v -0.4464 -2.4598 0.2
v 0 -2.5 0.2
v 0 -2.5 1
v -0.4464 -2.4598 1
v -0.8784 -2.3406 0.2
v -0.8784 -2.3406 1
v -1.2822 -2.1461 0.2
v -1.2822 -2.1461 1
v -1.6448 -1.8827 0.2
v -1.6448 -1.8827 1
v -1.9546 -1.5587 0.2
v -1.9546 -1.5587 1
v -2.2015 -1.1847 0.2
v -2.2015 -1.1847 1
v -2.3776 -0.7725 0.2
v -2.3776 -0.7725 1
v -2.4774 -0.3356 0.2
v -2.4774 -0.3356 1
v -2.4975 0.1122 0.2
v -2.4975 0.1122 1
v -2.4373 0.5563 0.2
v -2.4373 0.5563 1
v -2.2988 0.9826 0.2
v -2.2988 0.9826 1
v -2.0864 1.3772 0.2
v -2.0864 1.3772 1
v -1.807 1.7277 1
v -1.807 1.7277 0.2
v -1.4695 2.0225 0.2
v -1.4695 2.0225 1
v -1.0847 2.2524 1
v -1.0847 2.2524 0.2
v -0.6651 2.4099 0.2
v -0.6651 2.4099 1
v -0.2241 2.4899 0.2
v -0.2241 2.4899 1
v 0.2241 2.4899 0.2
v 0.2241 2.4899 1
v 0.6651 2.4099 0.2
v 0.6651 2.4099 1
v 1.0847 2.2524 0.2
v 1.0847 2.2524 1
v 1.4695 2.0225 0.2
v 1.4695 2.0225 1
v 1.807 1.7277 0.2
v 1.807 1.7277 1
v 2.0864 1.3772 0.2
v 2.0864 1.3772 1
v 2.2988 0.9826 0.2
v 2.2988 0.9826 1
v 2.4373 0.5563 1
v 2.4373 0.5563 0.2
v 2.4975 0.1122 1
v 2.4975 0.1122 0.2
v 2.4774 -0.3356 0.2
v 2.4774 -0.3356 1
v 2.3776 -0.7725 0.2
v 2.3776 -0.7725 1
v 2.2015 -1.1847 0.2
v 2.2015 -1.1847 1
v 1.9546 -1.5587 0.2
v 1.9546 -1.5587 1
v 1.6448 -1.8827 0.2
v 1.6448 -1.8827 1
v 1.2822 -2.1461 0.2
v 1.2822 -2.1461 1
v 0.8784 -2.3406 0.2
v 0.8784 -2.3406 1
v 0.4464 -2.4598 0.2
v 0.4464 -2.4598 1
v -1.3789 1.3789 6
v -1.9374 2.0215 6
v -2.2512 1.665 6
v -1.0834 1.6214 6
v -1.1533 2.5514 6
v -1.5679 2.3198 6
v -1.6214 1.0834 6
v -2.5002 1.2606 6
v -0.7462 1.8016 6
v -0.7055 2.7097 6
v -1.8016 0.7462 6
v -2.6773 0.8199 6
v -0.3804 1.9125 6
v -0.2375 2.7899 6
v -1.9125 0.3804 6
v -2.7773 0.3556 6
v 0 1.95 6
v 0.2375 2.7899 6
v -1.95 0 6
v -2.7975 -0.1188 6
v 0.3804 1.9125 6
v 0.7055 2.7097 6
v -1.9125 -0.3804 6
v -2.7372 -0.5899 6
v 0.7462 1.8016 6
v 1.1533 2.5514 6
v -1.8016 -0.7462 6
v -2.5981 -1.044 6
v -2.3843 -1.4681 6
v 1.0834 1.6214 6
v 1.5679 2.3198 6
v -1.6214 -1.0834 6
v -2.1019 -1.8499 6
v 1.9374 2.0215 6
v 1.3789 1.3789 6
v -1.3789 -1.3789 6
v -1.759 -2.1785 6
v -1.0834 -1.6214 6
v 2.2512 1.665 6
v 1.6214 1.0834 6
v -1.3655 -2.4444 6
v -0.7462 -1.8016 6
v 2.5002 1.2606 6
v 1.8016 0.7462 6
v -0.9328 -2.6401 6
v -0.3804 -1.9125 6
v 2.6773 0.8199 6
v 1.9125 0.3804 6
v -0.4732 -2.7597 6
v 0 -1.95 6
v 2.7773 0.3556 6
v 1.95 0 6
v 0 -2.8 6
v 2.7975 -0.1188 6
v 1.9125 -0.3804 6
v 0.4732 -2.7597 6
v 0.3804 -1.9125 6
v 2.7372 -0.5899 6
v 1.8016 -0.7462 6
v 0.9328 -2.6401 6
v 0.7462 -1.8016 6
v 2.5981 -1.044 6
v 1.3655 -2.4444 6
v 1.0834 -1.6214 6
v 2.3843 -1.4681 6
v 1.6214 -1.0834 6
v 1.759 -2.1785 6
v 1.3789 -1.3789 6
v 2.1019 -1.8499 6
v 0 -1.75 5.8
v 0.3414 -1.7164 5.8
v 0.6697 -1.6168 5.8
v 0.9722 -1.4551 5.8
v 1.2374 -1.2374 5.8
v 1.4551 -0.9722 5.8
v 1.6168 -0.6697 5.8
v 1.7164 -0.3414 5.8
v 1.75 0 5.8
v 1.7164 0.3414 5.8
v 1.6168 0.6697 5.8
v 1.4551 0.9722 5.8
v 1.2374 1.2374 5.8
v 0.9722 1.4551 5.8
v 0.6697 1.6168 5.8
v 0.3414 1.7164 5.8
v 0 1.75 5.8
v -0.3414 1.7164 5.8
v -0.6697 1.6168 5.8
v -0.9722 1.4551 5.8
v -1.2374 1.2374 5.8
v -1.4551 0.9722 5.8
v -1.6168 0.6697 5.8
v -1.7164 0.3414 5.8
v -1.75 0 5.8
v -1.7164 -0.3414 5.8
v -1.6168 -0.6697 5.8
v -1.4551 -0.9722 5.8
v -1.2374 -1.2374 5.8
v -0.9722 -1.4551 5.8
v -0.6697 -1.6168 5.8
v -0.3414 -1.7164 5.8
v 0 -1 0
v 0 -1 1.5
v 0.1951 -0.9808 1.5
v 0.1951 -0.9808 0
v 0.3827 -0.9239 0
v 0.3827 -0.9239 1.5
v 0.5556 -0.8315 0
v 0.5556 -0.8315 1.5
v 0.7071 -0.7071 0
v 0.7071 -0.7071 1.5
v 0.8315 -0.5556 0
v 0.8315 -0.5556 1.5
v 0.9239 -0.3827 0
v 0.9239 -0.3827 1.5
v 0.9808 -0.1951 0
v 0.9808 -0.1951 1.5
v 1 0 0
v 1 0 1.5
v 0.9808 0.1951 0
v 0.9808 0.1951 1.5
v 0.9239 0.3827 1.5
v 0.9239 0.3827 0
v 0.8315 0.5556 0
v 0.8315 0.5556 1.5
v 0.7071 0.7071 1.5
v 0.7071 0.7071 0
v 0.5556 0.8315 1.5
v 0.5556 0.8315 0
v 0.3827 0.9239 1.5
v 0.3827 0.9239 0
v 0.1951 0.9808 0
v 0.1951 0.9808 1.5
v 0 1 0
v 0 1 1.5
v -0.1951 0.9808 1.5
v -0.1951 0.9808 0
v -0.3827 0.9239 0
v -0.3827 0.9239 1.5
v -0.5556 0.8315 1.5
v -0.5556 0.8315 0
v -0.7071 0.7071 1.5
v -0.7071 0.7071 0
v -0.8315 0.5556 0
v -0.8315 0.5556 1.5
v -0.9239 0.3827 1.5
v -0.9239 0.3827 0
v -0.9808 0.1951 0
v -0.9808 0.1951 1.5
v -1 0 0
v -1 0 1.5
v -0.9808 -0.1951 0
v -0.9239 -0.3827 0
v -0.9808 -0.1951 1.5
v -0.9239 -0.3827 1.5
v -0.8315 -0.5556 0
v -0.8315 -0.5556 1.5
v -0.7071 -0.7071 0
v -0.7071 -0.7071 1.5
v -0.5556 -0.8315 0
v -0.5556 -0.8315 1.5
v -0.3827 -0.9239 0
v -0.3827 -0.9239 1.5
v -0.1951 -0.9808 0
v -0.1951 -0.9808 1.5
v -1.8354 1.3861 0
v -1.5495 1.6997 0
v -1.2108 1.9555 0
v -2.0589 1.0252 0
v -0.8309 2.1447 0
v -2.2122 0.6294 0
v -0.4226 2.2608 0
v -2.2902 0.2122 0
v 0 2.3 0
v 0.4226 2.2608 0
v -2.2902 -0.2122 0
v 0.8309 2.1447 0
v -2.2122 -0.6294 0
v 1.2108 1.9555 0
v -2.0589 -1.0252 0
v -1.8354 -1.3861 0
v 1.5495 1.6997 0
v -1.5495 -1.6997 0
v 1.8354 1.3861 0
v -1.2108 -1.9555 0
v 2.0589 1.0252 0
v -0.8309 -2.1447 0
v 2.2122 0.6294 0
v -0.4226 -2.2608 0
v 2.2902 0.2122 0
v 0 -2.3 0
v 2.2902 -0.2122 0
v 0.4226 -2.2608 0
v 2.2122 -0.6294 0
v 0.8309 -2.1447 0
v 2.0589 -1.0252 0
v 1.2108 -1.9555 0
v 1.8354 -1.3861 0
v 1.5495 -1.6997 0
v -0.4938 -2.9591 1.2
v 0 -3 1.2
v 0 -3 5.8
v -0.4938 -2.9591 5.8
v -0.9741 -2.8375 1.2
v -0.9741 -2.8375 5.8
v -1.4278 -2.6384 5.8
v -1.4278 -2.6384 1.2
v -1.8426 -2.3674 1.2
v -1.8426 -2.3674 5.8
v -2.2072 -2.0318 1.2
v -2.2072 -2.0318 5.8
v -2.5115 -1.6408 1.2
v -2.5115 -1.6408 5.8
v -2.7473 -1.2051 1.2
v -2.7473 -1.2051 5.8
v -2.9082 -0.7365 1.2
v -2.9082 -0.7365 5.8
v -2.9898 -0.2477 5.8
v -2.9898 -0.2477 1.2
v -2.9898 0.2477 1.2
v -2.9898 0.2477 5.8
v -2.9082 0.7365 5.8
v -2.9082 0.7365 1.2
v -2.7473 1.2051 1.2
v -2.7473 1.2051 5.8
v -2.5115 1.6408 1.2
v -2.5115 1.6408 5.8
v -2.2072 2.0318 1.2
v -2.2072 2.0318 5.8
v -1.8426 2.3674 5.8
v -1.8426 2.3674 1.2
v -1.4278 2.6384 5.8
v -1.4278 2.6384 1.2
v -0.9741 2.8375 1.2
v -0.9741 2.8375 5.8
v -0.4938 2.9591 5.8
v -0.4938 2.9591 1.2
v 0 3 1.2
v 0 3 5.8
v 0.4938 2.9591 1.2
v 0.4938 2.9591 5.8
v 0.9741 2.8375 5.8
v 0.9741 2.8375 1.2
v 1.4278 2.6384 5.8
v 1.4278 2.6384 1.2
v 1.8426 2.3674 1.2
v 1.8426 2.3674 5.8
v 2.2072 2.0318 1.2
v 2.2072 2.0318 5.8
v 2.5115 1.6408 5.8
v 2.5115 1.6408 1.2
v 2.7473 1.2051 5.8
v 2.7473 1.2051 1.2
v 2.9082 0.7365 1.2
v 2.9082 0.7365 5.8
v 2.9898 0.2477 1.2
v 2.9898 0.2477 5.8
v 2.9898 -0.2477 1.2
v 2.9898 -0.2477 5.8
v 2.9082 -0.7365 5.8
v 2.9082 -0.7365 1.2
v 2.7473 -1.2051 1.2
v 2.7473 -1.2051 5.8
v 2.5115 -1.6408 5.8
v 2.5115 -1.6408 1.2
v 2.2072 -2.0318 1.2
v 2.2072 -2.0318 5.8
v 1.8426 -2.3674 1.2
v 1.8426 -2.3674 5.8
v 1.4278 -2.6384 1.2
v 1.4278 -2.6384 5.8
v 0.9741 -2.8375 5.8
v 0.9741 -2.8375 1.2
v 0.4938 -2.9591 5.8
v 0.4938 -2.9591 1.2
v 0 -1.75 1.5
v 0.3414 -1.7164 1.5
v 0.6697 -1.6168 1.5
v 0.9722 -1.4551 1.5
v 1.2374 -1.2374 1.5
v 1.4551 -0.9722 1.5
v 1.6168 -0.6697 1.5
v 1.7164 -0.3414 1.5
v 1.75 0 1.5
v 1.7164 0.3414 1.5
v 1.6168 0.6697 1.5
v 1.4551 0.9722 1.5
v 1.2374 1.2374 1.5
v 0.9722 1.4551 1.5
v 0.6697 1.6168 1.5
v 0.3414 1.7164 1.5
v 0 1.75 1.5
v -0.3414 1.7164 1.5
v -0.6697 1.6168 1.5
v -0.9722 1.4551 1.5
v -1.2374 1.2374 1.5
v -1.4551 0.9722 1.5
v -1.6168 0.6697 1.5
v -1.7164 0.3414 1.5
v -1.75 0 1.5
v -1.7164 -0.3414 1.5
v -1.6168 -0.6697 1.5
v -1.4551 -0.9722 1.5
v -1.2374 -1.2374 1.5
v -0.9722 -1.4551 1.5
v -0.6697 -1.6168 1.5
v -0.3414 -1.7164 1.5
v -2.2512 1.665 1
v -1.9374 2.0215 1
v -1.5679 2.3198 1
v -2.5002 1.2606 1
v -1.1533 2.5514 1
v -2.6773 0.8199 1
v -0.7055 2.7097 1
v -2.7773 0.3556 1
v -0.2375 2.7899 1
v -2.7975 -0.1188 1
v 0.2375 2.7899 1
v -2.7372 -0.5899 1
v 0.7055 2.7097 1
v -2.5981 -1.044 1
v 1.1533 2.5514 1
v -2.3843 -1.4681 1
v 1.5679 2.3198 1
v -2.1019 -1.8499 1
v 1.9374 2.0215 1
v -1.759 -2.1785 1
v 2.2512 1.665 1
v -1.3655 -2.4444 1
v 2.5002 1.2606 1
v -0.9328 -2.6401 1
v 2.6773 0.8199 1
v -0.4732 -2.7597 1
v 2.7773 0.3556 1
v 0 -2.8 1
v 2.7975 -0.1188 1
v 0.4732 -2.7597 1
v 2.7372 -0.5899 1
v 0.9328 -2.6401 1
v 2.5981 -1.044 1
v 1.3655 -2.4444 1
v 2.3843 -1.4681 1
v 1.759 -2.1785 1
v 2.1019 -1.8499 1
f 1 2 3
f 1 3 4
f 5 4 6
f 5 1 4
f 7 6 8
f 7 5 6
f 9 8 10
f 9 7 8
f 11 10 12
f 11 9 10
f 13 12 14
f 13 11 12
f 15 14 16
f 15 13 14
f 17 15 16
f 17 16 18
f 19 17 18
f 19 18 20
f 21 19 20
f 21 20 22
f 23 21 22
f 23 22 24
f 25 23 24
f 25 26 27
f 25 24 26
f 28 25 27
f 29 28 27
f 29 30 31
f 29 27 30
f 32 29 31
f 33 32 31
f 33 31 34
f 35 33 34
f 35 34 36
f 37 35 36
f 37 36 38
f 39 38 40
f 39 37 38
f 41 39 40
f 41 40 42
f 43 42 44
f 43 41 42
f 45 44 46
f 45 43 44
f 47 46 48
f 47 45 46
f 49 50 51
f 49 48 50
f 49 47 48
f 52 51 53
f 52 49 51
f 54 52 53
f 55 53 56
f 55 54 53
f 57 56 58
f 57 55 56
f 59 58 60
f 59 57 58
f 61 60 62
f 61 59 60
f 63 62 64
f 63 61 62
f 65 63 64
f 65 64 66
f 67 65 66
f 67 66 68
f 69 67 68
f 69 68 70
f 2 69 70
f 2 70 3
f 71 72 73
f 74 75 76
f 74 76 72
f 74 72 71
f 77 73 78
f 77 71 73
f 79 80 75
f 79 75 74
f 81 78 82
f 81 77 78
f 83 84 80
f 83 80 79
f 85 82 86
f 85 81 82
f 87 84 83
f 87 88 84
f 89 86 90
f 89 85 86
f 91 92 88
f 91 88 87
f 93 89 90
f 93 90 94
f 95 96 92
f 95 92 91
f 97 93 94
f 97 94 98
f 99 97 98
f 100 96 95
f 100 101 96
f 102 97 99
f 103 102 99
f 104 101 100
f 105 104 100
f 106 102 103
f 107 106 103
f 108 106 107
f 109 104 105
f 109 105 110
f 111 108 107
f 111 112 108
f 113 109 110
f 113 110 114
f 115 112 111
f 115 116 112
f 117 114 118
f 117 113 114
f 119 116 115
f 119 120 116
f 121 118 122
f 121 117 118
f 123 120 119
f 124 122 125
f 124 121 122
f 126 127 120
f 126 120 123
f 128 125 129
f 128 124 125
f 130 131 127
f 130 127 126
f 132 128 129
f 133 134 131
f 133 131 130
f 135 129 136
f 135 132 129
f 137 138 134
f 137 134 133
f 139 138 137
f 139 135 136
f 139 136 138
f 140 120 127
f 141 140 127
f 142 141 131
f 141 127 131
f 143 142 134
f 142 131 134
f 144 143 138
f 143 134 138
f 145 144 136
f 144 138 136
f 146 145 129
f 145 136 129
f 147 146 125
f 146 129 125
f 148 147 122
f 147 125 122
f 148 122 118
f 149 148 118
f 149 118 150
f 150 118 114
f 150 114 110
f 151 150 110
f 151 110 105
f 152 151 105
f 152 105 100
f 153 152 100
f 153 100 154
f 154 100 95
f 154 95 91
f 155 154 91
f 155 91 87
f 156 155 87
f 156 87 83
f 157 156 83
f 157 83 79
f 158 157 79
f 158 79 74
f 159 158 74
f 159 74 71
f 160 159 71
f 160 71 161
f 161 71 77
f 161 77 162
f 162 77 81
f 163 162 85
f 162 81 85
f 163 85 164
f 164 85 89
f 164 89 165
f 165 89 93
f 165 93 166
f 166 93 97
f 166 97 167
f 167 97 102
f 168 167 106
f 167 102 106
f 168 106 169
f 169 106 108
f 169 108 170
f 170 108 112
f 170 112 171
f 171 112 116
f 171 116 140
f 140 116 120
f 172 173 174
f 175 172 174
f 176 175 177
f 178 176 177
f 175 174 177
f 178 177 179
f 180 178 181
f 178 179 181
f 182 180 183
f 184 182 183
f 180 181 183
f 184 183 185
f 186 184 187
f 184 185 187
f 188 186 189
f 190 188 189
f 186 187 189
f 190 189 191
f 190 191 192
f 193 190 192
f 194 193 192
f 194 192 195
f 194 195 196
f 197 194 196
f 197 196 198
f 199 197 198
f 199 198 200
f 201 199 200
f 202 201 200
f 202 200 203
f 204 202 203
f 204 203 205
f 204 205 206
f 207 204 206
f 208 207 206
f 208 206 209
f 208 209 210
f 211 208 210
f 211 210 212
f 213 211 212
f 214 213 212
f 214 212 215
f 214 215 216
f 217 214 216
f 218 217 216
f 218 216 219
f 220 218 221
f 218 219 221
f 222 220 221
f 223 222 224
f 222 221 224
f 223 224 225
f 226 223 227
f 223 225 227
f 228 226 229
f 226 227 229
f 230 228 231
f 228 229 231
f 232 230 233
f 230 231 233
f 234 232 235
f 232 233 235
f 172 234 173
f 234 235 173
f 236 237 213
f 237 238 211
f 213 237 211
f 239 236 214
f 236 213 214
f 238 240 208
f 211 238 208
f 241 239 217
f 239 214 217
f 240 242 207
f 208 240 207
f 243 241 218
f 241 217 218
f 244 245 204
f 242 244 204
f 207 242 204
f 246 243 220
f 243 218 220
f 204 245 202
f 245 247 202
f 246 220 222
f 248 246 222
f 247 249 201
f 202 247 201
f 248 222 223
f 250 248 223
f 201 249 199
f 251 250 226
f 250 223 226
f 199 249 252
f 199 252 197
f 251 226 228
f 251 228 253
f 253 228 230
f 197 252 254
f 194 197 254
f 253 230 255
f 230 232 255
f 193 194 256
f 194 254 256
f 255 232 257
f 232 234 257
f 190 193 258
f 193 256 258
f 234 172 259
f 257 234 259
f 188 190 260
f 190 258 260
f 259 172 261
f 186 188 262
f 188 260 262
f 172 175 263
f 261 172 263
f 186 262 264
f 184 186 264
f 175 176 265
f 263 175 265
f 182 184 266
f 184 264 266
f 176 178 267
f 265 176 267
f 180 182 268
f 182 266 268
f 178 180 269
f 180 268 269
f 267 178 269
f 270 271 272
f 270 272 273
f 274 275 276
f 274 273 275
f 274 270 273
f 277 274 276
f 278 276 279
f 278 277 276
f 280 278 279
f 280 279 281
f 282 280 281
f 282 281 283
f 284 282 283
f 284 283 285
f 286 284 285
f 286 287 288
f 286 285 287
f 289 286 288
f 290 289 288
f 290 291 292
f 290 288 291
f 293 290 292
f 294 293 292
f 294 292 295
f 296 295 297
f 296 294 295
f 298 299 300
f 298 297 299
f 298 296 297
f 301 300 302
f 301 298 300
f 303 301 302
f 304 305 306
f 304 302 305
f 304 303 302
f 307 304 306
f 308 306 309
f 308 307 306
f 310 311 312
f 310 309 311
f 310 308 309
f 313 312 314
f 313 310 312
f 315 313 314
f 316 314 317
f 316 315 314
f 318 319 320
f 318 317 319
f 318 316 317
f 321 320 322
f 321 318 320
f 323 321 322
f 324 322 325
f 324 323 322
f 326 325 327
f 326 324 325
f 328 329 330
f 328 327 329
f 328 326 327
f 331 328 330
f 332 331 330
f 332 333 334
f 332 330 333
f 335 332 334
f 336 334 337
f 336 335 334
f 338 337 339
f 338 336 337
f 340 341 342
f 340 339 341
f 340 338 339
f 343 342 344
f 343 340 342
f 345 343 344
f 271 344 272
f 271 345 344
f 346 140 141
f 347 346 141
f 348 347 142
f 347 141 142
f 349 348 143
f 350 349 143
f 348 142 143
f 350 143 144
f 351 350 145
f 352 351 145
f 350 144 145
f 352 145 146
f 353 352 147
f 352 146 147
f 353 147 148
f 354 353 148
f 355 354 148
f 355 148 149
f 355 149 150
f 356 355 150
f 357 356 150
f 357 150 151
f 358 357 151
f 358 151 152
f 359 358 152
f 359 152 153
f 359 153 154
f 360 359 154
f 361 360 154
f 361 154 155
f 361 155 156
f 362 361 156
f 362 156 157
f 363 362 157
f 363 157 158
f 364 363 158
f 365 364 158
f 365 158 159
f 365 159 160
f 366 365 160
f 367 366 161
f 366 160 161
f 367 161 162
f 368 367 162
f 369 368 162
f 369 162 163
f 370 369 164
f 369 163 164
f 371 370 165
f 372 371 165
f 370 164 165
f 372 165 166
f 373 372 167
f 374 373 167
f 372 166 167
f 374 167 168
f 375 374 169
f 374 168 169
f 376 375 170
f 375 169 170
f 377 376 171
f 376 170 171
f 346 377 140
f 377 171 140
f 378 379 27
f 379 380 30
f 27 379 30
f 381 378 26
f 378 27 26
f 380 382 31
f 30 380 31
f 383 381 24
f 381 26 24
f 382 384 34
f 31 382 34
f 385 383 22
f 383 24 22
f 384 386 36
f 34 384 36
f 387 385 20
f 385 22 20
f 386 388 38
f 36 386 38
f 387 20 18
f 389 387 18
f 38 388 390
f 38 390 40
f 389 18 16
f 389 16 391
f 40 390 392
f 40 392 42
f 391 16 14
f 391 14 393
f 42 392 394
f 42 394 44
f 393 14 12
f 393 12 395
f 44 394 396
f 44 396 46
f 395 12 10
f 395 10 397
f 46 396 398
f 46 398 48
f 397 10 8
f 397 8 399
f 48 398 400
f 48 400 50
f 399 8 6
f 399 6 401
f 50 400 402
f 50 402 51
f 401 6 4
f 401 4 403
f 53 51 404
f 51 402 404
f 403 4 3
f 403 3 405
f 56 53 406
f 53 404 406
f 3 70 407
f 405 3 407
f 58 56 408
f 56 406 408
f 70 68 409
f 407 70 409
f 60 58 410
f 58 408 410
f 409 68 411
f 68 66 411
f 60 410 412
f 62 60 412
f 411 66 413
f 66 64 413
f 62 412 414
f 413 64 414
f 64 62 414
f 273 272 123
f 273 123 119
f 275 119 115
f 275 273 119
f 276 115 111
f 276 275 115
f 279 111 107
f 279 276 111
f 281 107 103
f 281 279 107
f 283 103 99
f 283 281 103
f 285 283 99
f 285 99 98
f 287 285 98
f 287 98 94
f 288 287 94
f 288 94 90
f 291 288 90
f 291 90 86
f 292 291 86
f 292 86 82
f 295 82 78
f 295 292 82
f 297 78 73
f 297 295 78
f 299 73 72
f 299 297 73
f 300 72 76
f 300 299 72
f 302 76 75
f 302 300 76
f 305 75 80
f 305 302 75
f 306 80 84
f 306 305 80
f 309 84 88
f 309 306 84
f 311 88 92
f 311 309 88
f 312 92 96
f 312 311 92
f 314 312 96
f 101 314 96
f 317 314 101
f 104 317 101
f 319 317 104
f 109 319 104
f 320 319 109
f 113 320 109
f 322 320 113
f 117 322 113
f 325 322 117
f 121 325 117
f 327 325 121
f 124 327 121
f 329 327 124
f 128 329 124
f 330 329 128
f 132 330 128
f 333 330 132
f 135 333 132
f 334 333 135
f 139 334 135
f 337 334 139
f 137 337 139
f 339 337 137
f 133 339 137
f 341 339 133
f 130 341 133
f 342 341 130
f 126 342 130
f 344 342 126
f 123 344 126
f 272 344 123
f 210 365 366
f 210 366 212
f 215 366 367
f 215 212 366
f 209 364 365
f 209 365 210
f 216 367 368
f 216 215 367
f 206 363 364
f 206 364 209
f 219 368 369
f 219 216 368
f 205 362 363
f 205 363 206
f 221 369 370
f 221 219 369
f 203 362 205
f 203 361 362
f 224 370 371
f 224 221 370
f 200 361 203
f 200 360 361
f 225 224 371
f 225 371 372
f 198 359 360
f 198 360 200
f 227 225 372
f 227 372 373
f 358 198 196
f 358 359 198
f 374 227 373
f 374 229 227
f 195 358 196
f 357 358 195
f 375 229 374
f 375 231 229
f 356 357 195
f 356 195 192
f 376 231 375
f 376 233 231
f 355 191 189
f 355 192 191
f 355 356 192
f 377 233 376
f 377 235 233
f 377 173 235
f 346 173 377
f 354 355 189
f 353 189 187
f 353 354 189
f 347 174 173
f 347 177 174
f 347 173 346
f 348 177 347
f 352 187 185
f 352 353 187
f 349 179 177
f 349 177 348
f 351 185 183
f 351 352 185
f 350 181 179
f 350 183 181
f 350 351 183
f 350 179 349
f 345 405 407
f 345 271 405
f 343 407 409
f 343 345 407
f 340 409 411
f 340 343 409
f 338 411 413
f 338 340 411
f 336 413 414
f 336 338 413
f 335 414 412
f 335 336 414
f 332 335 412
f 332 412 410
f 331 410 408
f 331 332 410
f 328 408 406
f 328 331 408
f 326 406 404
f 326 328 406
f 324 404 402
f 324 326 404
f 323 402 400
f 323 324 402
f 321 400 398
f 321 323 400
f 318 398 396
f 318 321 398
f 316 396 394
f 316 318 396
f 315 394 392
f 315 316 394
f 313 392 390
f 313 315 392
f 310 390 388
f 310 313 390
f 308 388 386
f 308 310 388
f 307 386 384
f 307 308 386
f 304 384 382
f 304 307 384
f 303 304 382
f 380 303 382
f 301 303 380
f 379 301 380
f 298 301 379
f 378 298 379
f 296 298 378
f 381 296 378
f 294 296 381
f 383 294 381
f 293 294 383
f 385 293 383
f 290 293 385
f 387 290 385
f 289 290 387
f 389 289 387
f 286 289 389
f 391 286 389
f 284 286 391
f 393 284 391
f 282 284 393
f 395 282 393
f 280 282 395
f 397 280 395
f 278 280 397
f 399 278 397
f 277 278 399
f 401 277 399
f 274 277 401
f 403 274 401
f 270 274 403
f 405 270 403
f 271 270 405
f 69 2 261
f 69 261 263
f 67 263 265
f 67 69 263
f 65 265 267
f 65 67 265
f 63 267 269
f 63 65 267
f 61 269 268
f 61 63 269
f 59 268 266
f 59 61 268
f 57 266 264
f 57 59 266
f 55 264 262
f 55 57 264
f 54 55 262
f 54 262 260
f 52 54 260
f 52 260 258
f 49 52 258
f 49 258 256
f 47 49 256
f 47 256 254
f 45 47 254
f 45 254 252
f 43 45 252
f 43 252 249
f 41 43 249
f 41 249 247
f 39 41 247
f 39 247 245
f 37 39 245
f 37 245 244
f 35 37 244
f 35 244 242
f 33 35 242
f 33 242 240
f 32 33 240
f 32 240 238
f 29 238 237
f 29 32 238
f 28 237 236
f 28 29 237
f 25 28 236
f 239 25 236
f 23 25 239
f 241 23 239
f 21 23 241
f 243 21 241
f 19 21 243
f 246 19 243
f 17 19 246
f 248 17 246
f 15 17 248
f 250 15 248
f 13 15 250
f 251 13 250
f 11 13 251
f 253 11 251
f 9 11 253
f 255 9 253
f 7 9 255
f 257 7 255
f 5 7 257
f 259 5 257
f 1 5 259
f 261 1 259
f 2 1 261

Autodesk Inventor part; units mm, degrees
ref_plane "YZ Plane" through (0, 0, 0) normal (1, 0, 0) x (0, 1, 0)
ref_plane "XZ Plane" through (0, 0, 0) normal (0, 1, 0) x (-1, 0, 0)
ref_plane "XY Plane" through (0, 0, 0) normal (0, 0, 1) x (1, 0, 0)
sketch "Skizze3" plane through (0, 0, 0) normal (1, 0, 0) x (0, 1, 0)
  line L0 (0, 0) -> (0, 9.4008)
  line L1 (-1, 0) -> (-1, 1.5)
  line L2 (-1, 1.5) -> (-1.75, 1.5)
  line L3 (-1.75, 1.5) -> (-1.75, 6)
  line L4 (-1.75, 6) -> (-3, 6)
  line L5 (-2.5, 0) -> (0, 0)
  line L6 (-3, 6) -> (-3, 1)
  line L7 (-3, 1) -> (-2.5, 1)
  line L8 (-2.5, 1) -> (-2.5, 0)
  dimension "d4" = 2
  dimension "d5" = 1.5
  dimension "d6" = 3.5
  dimension "d8" = 5
  dimension "d9" = 6
  dimension "d10" = 1
  dimension "d11" = 6
revolve "Umdrehung1" add sketch "Skizze3" angle 360 about axis through (0, 0, 0) along (0, 0, 1)
chamfer "Fase1" distance 0.2 angle 45 4 edges at (0, 1.75, 6) (0, 2.5, 0) (0, 3, 1) (0, 3, 6)
thread "Gewinde2" size "M6x1" class "6g" standard "ISO Metric profile" length 5
properties part number "BT004_huenin20_23" material "Kupfer"
